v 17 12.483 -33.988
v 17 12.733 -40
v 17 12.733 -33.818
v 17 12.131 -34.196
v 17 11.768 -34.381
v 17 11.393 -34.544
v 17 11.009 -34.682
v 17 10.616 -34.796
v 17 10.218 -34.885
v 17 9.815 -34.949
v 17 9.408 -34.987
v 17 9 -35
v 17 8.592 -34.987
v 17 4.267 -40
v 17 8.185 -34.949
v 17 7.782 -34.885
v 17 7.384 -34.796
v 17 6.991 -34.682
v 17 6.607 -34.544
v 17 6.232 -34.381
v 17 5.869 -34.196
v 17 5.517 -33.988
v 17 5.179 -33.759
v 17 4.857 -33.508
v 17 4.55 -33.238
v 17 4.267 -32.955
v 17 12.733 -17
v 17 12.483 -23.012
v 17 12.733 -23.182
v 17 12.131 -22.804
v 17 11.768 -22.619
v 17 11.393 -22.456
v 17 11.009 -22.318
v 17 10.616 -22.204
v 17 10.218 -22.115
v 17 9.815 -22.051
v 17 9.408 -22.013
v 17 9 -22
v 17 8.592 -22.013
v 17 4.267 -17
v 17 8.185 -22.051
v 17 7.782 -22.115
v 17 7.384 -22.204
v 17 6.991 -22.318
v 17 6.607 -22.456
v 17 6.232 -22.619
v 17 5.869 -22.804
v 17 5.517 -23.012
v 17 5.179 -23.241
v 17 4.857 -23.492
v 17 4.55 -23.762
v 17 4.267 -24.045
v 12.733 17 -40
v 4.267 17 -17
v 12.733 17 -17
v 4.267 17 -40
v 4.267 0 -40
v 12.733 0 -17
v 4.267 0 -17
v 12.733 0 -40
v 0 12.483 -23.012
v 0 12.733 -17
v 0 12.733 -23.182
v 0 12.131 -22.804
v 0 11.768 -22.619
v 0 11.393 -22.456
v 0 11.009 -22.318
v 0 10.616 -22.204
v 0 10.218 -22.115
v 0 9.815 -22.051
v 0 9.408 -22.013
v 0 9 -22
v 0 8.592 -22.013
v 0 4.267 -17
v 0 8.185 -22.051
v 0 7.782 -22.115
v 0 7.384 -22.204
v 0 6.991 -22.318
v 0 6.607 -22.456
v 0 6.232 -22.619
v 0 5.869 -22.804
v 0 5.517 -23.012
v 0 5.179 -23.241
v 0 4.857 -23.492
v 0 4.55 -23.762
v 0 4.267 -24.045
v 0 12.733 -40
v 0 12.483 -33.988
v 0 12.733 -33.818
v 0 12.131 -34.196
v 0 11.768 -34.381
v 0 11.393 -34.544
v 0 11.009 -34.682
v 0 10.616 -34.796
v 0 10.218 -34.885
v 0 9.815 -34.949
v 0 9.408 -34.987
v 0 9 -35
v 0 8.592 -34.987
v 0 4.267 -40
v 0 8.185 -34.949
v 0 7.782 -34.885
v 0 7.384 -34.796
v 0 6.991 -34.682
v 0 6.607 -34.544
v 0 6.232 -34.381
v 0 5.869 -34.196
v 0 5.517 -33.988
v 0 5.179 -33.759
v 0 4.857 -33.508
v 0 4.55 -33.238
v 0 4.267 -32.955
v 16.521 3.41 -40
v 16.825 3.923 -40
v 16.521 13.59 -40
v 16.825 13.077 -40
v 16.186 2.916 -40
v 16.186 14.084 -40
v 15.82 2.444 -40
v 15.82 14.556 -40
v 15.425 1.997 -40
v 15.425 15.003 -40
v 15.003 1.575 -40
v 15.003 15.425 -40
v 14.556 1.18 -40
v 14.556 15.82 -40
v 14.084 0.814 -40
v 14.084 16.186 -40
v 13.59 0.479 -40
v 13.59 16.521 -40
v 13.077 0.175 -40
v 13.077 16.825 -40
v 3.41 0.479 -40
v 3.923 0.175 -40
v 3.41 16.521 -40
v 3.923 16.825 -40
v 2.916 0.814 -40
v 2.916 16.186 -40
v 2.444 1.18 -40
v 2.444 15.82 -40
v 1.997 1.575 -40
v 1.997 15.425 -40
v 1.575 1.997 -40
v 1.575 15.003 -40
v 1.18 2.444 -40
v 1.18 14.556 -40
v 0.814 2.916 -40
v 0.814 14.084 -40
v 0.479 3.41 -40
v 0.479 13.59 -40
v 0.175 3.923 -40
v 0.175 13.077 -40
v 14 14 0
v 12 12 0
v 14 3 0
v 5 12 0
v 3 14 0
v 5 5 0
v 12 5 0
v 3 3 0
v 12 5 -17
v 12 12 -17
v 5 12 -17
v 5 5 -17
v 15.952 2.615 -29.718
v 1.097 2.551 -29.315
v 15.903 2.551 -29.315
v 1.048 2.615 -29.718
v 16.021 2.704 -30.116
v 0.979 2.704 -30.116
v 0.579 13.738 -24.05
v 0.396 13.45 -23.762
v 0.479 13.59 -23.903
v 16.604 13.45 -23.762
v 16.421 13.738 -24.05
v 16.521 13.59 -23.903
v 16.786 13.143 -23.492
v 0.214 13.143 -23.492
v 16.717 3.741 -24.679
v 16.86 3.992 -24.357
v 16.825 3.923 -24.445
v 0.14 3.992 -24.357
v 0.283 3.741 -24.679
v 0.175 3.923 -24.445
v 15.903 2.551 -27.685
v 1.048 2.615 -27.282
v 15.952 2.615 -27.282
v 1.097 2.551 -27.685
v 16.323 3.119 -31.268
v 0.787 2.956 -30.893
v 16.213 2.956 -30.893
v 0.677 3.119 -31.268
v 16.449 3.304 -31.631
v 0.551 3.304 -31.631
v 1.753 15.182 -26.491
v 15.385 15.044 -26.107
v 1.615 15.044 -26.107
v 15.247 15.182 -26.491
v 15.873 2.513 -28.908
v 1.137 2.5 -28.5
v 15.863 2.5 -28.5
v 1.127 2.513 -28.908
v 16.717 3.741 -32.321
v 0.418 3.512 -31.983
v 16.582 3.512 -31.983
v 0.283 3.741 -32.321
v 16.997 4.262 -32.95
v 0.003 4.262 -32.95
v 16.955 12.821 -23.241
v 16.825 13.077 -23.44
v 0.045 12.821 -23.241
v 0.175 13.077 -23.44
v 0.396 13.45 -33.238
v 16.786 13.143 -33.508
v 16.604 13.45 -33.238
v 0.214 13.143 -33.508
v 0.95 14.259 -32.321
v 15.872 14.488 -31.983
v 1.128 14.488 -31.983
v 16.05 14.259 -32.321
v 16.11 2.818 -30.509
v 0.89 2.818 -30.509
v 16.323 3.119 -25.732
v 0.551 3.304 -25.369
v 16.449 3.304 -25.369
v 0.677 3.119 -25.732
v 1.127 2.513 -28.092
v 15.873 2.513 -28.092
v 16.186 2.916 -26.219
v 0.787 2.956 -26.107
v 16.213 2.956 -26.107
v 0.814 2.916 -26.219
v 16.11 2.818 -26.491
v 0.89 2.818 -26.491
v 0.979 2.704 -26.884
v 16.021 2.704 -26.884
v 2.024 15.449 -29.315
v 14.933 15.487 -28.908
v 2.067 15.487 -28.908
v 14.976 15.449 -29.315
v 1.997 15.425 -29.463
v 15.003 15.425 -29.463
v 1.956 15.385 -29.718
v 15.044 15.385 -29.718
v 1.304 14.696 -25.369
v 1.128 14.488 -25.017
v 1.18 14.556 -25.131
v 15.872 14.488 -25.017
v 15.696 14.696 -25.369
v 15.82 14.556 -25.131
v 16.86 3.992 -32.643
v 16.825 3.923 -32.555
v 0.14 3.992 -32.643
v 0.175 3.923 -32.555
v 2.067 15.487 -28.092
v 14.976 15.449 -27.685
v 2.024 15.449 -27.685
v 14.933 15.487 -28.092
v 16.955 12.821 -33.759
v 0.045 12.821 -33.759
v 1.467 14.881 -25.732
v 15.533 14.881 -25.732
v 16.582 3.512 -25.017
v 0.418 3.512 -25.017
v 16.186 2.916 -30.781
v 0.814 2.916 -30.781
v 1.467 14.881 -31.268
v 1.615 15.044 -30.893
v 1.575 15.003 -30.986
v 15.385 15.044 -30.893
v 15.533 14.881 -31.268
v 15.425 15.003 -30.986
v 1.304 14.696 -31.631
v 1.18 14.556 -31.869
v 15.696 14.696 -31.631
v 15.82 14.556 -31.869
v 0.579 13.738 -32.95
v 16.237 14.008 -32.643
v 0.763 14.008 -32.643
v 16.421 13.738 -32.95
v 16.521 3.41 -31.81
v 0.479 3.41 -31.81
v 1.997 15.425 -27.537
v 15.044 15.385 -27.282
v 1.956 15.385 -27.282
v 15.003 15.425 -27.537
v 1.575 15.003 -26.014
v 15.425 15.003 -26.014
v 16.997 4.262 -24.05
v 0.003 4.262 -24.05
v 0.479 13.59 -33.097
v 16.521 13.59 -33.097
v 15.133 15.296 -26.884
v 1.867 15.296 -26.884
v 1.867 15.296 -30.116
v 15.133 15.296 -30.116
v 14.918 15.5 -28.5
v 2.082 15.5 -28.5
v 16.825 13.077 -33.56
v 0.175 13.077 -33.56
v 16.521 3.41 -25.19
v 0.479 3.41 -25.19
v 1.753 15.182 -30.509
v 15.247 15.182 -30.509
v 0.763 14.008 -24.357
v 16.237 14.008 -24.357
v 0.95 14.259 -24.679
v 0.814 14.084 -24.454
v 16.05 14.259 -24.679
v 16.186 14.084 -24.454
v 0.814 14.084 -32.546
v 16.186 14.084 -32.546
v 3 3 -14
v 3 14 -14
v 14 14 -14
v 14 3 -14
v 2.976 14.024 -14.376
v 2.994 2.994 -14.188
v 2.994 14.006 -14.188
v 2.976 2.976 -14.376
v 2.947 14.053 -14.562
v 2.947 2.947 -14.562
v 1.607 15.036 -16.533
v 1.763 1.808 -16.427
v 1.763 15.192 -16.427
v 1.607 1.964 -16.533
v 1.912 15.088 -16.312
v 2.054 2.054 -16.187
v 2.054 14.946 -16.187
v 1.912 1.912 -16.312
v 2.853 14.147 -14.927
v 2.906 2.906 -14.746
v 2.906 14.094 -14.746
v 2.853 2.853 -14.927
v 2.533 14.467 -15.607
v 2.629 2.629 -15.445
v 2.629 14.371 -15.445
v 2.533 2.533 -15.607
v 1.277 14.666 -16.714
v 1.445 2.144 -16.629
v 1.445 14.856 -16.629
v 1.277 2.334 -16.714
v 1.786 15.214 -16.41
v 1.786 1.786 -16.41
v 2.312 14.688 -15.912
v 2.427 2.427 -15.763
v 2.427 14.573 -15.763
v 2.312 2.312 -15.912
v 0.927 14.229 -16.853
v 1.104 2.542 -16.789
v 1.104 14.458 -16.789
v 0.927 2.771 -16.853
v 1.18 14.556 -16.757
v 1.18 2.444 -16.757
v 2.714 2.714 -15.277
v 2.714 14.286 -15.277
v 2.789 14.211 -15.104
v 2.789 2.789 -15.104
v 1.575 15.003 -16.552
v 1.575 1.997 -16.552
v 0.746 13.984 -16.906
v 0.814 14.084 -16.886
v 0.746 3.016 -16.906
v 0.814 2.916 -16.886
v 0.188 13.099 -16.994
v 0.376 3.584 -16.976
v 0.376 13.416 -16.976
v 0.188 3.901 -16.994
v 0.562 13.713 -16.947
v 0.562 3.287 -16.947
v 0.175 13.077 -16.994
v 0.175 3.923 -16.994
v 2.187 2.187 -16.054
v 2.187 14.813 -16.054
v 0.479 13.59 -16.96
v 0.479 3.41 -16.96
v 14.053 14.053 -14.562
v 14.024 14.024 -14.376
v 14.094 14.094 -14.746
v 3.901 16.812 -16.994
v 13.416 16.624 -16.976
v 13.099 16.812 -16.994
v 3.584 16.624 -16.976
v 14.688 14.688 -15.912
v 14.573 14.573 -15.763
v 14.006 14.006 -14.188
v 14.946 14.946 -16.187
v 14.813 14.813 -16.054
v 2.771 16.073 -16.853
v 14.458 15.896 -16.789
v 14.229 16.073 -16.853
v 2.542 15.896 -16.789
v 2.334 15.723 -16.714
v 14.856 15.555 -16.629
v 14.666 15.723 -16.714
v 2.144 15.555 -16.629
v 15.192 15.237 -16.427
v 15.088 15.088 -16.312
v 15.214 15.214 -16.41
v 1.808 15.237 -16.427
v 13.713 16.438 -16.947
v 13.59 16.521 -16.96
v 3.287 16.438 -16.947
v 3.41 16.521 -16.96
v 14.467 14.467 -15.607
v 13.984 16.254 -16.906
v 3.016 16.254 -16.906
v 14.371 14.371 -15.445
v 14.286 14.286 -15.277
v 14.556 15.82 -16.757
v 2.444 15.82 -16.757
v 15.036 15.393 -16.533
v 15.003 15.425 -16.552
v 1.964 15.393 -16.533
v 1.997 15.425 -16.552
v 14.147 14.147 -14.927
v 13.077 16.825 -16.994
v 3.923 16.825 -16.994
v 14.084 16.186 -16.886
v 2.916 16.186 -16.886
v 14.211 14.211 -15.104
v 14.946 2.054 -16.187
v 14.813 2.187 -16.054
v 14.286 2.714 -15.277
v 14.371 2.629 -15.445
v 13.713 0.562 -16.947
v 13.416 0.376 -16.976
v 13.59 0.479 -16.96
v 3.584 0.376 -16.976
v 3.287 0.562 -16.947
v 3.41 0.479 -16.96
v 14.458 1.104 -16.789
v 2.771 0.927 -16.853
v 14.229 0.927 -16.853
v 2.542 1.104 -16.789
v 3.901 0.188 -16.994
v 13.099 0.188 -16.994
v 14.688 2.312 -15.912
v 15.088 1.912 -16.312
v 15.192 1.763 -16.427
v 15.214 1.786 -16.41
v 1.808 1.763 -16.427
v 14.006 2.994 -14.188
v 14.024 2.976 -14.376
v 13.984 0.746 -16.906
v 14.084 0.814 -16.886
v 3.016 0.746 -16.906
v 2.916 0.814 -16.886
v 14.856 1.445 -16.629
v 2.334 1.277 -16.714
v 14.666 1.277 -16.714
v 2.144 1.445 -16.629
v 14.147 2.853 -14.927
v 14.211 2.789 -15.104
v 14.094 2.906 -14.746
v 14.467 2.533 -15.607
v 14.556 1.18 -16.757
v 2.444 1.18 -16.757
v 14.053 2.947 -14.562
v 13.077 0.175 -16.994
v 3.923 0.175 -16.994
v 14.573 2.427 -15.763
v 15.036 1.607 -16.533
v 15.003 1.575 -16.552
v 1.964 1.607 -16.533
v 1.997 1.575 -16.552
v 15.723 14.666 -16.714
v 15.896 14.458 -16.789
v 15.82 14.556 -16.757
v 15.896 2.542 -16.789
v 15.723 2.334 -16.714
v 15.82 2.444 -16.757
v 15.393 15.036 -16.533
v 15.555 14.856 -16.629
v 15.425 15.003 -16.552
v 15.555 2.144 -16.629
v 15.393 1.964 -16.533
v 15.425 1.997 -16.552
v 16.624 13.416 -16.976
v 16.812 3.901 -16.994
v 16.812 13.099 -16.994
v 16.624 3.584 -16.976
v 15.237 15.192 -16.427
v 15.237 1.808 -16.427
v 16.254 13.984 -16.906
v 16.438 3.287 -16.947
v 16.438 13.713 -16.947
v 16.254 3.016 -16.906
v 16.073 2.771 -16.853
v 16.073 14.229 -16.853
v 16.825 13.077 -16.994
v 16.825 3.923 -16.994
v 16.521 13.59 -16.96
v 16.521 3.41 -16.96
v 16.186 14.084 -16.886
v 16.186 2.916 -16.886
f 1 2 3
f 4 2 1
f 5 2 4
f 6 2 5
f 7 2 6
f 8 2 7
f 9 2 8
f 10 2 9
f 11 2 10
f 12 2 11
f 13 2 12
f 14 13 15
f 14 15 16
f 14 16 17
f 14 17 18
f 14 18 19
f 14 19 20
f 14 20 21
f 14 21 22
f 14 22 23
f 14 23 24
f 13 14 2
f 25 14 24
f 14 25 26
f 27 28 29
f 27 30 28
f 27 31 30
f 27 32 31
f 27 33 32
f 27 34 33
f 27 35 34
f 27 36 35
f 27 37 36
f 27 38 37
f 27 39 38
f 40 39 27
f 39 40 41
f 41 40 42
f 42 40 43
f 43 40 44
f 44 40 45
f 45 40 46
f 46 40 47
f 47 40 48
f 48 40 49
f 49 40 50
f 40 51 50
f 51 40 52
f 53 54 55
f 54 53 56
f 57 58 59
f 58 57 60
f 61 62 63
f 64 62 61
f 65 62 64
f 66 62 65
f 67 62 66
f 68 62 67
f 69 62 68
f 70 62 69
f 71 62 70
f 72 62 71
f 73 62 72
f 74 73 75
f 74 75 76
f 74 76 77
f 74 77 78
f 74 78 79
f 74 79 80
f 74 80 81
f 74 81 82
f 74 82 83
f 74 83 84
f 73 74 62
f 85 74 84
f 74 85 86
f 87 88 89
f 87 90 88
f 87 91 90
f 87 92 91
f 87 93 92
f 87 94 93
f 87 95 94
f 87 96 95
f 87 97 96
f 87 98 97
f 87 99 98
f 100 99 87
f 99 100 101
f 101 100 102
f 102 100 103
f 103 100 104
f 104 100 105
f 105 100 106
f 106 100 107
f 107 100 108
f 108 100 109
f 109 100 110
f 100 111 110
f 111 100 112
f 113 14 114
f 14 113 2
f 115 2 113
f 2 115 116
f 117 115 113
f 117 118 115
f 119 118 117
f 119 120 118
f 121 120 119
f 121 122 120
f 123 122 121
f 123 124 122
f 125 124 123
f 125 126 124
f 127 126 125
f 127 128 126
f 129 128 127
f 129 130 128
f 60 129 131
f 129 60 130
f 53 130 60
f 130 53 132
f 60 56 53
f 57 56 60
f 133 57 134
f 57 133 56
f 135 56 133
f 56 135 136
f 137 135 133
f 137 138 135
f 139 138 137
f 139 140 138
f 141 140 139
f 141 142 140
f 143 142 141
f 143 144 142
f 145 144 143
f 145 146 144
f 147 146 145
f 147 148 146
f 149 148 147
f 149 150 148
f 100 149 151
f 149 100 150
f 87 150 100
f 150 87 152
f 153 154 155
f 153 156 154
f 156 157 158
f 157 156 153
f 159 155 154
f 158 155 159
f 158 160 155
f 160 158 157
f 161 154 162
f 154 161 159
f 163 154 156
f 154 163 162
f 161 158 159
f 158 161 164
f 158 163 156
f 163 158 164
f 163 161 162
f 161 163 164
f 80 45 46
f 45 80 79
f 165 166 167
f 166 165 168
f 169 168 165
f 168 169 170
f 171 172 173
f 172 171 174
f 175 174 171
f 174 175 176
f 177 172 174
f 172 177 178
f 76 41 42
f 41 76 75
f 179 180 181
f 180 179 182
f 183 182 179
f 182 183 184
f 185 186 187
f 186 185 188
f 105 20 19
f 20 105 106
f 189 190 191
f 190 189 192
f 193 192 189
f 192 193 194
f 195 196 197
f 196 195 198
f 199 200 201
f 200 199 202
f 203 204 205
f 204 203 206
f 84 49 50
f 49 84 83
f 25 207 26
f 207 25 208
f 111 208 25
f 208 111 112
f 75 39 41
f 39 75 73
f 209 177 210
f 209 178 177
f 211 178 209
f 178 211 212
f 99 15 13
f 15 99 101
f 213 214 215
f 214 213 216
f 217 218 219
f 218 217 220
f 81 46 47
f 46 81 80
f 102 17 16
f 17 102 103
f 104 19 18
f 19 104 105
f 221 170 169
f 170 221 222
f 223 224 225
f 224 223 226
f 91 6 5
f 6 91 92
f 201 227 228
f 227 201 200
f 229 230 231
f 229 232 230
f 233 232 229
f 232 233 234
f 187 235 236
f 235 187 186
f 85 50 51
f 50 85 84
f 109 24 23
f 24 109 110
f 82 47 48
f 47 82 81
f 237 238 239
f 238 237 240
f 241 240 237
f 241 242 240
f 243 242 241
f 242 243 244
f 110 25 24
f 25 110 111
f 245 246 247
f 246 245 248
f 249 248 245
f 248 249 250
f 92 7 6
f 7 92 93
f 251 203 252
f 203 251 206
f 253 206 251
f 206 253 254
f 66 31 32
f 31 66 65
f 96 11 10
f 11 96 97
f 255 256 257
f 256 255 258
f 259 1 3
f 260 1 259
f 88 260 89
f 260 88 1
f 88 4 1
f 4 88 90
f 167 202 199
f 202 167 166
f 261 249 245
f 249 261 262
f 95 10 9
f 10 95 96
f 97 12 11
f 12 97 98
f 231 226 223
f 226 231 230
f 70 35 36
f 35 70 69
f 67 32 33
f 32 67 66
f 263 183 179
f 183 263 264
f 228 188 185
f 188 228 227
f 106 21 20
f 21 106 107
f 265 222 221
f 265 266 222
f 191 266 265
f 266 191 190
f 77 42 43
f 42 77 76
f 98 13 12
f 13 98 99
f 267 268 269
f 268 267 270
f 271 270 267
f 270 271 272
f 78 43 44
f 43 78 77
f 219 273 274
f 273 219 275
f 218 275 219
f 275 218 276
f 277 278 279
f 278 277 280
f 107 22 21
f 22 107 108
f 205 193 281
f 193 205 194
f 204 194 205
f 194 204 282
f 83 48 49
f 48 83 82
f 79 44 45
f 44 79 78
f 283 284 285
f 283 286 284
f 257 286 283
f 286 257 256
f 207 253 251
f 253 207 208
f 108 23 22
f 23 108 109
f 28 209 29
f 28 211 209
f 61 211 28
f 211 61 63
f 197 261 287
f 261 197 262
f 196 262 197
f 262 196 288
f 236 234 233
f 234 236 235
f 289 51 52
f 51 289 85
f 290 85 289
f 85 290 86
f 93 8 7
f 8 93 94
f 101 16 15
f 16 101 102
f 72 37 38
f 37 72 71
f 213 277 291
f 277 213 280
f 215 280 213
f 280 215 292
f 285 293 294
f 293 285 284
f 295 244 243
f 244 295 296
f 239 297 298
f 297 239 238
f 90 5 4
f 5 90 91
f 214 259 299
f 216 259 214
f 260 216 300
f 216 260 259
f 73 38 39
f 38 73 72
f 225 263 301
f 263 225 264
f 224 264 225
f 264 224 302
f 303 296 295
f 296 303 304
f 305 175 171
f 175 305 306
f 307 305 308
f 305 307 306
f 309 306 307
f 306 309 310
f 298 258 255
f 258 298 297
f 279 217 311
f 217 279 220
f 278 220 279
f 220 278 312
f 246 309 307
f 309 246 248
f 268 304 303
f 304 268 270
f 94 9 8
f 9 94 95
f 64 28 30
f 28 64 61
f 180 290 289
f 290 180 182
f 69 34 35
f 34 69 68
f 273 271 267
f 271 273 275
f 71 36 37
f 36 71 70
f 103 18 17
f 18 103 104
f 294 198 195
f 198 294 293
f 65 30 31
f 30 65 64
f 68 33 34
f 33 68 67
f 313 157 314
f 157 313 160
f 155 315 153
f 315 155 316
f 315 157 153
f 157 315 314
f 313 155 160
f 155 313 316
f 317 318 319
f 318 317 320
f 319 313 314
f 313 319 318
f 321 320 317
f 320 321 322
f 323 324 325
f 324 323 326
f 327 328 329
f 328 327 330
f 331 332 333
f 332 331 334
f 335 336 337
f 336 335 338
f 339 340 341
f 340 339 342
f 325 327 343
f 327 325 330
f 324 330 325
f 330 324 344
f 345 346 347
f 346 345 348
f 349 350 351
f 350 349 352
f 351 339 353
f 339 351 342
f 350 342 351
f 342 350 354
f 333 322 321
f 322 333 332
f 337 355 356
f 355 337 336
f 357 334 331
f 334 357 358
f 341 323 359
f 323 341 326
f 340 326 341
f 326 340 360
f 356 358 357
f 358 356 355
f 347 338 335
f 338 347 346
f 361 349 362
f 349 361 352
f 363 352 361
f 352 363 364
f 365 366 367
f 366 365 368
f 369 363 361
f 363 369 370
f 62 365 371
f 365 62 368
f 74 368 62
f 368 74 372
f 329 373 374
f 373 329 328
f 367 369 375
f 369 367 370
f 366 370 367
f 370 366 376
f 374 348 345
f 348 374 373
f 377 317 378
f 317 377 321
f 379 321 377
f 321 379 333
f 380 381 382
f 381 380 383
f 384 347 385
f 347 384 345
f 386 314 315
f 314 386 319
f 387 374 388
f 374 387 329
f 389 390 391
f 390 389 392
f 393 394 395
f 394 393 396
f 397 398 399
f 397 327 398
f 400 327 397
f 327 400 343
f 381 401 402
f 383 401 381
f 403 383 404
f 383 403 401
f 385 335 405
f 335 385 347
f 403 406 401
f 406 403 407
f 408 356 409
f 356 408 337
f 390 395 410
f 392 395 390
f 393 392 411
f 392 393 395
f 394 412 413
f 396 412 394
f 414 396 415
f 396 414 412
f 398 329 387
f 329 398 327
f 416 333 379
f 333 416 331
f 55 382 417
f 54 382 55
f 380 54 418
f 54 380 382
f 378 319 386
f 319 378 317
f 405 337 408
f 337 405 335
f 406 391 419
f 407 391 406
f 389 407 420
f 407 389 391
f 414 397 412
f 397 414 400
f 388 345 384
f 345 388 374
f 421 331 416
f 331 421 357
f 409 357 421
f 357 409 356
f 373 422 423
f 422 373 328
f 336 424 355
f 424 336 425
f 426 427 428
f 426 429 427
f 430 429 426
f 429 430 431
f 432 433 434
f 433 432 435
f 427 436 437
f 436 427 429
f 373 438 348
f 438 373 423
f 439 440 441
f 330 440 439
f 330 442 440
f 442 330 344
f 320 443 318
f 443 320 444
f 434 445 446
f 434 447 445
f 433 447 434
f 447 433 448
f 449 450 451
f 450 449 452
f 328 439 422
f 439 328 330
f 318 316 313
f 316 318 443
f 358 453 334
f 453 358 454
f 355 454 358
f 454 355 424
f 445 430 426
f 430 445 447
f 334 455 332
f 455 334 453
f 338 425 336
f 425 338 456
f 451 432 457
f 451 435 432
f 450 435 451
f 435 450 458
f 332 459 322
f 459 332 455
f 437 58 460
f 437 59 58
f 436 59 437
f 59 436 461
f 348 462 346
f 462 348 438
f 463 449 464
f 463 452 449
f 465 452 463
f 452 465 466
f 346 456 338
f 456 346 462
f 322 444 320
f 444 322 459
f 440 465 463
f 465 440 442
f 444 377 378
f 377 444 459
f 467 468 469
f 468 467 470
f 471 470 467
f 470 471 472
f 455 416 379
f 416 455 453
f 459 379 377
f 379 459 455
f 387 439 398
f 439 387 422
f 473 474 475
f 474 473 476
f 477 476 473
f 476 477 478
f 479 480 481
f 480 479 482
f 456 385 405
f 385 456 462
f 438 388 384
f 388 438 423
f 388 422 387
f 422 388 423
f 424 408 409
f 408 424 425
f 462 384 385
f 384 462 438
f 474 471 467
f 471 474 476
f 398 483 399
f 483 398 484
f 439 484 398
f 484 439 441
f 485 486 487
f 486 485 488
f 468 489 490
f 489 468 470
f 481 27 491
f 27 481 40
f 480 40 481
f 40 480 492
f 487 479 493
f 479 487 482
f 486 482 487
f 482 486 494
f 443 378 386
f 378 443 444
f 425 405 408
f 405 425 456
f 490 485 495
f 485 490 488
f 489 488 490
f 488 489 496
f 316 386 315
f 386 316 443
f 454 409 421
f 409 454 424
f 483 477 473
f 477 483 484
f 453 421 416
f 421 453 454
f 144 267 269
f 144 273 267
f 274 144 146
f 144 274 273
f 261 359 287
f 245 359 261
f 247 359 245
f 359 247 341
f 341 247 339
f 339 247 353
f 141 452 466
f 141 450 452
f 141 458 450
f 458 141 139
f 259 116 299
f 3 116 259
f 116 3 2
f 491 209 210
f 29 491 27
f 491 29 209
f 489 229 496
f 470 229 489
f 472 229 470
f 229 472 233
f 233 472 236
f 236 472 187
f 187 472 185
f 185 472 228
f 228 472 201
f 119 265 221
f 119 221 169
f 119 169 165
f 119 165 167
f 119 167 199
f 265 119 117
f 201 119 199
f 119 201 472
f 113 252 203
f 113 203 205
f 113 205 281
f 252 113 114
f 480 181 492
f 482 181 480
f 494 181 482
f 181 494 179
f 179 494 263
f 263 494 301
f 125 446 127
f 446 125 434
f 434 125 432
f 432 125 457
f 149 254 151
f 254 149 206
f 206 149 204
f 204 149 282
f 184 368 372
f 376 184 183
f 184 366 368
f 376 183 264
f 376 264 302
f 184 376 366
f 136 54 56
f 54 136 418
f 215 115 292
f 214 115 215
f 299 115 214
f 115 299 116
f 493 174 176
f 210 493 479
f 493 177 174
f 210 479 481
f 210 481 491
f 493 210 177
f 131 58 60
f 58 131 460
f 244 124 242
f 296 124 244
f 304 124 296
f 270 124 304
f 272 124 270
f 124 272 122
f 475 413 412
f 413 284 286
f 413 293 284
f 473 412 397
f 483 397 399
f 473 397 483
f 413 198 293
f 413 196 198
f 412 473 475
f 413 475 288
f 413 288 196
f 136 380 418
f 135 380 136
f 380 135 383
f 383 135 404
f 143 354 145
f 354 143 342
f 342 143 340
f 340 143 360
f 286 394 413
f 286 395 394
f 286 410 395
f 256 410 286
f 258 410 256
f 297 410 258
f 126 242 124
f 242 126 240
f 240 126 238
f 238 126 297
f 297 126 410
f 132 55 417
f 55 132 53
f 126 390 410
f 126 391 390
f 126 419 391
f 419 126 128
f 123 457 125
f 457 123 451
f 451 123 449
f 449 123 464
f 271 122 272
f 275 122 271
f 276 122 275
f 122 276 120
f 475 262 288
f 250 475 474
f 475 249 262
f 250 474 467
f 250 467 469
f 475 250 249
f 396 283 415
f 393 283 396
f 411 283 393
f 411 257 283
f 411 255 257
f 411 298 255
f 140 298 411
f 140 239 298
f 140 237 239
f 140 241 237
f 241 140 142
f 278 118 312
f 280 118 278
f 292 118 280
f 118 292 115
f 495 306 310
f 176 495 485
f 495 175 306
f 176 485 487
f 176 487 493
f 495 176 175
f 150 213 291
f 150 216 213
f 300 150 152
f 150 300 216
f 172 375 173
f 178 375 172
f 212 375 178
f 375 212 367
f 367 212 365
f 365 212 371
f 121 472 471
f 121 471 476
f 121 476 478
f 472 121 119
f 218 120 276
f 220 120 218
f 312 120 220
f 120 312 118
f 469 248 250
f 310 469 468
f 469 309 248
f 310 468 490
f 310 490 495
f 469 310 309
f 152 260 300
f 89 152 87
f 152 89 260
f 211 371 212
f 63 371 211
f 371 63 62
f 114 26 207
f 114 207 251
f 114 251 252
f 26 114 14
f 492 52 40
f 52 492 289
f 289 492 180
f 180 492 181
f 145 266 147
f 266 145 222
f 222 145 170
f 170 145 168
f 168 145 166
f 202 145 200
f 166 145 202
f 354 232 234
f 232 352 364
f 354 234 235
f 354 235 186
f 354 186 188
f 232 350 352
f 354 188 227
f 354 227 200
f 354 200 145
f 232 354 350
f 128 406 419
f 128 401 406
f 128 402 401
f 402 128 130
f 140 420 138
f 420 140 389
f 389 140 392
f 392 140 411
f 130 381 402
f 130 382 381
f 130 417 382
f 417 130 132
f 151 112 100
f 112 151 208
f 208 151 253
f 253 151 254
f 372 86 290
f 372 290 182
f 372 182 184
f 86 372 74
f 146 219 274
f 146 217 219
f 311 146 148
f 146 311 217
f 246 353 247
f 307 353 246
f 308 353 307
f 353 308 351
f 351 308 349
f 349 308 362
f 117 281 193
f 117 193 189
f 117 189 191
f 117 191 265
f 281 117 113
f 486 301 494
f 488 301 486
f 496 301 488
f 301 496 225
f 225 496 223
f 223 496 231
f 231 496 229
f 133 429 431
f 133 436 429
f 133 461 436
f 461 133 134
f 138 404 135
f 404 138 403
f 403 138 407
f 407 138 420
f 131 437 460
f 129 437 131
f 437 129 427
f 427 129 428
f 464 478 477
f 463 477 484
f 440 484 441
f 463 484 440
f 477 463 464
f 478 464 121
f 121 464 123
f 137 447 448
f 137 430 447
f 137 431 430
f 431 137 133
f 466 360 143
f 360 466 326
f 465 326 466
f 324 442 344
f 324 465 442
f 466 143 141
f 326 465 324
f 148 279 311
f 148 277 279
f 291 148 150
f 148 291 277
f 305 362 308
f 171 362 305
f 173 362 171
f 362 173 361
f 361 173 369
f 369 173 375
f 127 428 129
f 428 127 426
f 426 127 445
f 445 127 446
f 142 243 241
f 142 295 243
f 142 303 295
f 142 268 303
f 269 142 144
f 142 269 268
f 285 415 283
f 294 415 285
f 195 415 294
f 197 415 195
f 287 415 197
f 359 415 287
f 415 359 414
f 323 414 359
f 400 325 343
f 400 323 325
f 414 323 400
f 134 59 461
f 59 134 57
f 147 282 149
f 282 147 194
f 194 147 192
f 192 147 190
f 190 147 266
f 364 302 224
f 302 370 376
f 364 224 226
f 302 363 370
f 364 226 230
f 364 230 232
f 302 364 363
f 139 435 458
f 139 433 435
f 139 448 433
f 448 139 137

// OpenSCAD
stick_length = 17;
stick_dia = 7;
wd = 5;

motor_r = 6.5;

rotate([-90,0,0]) {

	intersection() {
			difference() {
			cube([stick_dia + 2*wd, stick_length + wd + 2*motor_r + wd, stick_dia + 2*wd]);
		
			translate([wd,0,wd]) {	
				cube([stick_dia,stick_length,stick_dia]);
			}

			translate([0,stick_length + wd + motor_r,motor_r + wd/2]) {
				rotate([0,90,0])
				cylinder(h=stick_dia + 2*wd, r=motor_r, $fn=100);
			}

			translate([-(wd + stick_dia + 2),0,0]) {
				cube([stick_dia + 2*wd, stick_length - 3, stick_dia + 2*wd]);
			}
			translate([wd + stick_dia + 2,0,0]) {
				cube([stick_dia + 2*wd, stick_length - 3, stick_dia + 2*wd]);
			}
			translate([0,0,wd + stick_dia + 2]) {
				cube([stick_dia + 2*wd, stick_length - 3, stick_dia + 2*wd]);
			}
			translate([0,0,-(wd + stick_dia + 2)]) {
				cube([stick_dia + 2*wd, stick_length - 3, stick_dia + 2*wd]);
			}
			translate([0,stick_length - 3,0]) {
				rotate([0,0,0])
				cylinder(h=stick_dia + 2*wd, r=3, $fn=100);
			}
			translate([0,stick_length - 3,stick_dia + 2*wd]) {
				rotate([0,90,0])
				cylinder(h=stick_dia + 2*wd, r=3, $fn=100);
			}
			translate([0,stick_length - 3,0]) {
				rotate([0,90,0])
				cylinder(h=stick_dia + 2*wd, r=3, $fn=100);
			}
			translate([stick_dia + 2*wd,stick_length - 3,0]) {
				rotate([0,0,0])
				cylinder(h=stick_dia + 2*wd, r=3, $fn=100);
			}
			
		}
		translate([8.5,stick_length + wd + 2*motor_r + wd,8.5]) {
			rotate([90,0,0])
			cylinder(h=stick_length + wd + 2*motor_r + wd, r=9.5, $fn=100);
		}
	}
}
